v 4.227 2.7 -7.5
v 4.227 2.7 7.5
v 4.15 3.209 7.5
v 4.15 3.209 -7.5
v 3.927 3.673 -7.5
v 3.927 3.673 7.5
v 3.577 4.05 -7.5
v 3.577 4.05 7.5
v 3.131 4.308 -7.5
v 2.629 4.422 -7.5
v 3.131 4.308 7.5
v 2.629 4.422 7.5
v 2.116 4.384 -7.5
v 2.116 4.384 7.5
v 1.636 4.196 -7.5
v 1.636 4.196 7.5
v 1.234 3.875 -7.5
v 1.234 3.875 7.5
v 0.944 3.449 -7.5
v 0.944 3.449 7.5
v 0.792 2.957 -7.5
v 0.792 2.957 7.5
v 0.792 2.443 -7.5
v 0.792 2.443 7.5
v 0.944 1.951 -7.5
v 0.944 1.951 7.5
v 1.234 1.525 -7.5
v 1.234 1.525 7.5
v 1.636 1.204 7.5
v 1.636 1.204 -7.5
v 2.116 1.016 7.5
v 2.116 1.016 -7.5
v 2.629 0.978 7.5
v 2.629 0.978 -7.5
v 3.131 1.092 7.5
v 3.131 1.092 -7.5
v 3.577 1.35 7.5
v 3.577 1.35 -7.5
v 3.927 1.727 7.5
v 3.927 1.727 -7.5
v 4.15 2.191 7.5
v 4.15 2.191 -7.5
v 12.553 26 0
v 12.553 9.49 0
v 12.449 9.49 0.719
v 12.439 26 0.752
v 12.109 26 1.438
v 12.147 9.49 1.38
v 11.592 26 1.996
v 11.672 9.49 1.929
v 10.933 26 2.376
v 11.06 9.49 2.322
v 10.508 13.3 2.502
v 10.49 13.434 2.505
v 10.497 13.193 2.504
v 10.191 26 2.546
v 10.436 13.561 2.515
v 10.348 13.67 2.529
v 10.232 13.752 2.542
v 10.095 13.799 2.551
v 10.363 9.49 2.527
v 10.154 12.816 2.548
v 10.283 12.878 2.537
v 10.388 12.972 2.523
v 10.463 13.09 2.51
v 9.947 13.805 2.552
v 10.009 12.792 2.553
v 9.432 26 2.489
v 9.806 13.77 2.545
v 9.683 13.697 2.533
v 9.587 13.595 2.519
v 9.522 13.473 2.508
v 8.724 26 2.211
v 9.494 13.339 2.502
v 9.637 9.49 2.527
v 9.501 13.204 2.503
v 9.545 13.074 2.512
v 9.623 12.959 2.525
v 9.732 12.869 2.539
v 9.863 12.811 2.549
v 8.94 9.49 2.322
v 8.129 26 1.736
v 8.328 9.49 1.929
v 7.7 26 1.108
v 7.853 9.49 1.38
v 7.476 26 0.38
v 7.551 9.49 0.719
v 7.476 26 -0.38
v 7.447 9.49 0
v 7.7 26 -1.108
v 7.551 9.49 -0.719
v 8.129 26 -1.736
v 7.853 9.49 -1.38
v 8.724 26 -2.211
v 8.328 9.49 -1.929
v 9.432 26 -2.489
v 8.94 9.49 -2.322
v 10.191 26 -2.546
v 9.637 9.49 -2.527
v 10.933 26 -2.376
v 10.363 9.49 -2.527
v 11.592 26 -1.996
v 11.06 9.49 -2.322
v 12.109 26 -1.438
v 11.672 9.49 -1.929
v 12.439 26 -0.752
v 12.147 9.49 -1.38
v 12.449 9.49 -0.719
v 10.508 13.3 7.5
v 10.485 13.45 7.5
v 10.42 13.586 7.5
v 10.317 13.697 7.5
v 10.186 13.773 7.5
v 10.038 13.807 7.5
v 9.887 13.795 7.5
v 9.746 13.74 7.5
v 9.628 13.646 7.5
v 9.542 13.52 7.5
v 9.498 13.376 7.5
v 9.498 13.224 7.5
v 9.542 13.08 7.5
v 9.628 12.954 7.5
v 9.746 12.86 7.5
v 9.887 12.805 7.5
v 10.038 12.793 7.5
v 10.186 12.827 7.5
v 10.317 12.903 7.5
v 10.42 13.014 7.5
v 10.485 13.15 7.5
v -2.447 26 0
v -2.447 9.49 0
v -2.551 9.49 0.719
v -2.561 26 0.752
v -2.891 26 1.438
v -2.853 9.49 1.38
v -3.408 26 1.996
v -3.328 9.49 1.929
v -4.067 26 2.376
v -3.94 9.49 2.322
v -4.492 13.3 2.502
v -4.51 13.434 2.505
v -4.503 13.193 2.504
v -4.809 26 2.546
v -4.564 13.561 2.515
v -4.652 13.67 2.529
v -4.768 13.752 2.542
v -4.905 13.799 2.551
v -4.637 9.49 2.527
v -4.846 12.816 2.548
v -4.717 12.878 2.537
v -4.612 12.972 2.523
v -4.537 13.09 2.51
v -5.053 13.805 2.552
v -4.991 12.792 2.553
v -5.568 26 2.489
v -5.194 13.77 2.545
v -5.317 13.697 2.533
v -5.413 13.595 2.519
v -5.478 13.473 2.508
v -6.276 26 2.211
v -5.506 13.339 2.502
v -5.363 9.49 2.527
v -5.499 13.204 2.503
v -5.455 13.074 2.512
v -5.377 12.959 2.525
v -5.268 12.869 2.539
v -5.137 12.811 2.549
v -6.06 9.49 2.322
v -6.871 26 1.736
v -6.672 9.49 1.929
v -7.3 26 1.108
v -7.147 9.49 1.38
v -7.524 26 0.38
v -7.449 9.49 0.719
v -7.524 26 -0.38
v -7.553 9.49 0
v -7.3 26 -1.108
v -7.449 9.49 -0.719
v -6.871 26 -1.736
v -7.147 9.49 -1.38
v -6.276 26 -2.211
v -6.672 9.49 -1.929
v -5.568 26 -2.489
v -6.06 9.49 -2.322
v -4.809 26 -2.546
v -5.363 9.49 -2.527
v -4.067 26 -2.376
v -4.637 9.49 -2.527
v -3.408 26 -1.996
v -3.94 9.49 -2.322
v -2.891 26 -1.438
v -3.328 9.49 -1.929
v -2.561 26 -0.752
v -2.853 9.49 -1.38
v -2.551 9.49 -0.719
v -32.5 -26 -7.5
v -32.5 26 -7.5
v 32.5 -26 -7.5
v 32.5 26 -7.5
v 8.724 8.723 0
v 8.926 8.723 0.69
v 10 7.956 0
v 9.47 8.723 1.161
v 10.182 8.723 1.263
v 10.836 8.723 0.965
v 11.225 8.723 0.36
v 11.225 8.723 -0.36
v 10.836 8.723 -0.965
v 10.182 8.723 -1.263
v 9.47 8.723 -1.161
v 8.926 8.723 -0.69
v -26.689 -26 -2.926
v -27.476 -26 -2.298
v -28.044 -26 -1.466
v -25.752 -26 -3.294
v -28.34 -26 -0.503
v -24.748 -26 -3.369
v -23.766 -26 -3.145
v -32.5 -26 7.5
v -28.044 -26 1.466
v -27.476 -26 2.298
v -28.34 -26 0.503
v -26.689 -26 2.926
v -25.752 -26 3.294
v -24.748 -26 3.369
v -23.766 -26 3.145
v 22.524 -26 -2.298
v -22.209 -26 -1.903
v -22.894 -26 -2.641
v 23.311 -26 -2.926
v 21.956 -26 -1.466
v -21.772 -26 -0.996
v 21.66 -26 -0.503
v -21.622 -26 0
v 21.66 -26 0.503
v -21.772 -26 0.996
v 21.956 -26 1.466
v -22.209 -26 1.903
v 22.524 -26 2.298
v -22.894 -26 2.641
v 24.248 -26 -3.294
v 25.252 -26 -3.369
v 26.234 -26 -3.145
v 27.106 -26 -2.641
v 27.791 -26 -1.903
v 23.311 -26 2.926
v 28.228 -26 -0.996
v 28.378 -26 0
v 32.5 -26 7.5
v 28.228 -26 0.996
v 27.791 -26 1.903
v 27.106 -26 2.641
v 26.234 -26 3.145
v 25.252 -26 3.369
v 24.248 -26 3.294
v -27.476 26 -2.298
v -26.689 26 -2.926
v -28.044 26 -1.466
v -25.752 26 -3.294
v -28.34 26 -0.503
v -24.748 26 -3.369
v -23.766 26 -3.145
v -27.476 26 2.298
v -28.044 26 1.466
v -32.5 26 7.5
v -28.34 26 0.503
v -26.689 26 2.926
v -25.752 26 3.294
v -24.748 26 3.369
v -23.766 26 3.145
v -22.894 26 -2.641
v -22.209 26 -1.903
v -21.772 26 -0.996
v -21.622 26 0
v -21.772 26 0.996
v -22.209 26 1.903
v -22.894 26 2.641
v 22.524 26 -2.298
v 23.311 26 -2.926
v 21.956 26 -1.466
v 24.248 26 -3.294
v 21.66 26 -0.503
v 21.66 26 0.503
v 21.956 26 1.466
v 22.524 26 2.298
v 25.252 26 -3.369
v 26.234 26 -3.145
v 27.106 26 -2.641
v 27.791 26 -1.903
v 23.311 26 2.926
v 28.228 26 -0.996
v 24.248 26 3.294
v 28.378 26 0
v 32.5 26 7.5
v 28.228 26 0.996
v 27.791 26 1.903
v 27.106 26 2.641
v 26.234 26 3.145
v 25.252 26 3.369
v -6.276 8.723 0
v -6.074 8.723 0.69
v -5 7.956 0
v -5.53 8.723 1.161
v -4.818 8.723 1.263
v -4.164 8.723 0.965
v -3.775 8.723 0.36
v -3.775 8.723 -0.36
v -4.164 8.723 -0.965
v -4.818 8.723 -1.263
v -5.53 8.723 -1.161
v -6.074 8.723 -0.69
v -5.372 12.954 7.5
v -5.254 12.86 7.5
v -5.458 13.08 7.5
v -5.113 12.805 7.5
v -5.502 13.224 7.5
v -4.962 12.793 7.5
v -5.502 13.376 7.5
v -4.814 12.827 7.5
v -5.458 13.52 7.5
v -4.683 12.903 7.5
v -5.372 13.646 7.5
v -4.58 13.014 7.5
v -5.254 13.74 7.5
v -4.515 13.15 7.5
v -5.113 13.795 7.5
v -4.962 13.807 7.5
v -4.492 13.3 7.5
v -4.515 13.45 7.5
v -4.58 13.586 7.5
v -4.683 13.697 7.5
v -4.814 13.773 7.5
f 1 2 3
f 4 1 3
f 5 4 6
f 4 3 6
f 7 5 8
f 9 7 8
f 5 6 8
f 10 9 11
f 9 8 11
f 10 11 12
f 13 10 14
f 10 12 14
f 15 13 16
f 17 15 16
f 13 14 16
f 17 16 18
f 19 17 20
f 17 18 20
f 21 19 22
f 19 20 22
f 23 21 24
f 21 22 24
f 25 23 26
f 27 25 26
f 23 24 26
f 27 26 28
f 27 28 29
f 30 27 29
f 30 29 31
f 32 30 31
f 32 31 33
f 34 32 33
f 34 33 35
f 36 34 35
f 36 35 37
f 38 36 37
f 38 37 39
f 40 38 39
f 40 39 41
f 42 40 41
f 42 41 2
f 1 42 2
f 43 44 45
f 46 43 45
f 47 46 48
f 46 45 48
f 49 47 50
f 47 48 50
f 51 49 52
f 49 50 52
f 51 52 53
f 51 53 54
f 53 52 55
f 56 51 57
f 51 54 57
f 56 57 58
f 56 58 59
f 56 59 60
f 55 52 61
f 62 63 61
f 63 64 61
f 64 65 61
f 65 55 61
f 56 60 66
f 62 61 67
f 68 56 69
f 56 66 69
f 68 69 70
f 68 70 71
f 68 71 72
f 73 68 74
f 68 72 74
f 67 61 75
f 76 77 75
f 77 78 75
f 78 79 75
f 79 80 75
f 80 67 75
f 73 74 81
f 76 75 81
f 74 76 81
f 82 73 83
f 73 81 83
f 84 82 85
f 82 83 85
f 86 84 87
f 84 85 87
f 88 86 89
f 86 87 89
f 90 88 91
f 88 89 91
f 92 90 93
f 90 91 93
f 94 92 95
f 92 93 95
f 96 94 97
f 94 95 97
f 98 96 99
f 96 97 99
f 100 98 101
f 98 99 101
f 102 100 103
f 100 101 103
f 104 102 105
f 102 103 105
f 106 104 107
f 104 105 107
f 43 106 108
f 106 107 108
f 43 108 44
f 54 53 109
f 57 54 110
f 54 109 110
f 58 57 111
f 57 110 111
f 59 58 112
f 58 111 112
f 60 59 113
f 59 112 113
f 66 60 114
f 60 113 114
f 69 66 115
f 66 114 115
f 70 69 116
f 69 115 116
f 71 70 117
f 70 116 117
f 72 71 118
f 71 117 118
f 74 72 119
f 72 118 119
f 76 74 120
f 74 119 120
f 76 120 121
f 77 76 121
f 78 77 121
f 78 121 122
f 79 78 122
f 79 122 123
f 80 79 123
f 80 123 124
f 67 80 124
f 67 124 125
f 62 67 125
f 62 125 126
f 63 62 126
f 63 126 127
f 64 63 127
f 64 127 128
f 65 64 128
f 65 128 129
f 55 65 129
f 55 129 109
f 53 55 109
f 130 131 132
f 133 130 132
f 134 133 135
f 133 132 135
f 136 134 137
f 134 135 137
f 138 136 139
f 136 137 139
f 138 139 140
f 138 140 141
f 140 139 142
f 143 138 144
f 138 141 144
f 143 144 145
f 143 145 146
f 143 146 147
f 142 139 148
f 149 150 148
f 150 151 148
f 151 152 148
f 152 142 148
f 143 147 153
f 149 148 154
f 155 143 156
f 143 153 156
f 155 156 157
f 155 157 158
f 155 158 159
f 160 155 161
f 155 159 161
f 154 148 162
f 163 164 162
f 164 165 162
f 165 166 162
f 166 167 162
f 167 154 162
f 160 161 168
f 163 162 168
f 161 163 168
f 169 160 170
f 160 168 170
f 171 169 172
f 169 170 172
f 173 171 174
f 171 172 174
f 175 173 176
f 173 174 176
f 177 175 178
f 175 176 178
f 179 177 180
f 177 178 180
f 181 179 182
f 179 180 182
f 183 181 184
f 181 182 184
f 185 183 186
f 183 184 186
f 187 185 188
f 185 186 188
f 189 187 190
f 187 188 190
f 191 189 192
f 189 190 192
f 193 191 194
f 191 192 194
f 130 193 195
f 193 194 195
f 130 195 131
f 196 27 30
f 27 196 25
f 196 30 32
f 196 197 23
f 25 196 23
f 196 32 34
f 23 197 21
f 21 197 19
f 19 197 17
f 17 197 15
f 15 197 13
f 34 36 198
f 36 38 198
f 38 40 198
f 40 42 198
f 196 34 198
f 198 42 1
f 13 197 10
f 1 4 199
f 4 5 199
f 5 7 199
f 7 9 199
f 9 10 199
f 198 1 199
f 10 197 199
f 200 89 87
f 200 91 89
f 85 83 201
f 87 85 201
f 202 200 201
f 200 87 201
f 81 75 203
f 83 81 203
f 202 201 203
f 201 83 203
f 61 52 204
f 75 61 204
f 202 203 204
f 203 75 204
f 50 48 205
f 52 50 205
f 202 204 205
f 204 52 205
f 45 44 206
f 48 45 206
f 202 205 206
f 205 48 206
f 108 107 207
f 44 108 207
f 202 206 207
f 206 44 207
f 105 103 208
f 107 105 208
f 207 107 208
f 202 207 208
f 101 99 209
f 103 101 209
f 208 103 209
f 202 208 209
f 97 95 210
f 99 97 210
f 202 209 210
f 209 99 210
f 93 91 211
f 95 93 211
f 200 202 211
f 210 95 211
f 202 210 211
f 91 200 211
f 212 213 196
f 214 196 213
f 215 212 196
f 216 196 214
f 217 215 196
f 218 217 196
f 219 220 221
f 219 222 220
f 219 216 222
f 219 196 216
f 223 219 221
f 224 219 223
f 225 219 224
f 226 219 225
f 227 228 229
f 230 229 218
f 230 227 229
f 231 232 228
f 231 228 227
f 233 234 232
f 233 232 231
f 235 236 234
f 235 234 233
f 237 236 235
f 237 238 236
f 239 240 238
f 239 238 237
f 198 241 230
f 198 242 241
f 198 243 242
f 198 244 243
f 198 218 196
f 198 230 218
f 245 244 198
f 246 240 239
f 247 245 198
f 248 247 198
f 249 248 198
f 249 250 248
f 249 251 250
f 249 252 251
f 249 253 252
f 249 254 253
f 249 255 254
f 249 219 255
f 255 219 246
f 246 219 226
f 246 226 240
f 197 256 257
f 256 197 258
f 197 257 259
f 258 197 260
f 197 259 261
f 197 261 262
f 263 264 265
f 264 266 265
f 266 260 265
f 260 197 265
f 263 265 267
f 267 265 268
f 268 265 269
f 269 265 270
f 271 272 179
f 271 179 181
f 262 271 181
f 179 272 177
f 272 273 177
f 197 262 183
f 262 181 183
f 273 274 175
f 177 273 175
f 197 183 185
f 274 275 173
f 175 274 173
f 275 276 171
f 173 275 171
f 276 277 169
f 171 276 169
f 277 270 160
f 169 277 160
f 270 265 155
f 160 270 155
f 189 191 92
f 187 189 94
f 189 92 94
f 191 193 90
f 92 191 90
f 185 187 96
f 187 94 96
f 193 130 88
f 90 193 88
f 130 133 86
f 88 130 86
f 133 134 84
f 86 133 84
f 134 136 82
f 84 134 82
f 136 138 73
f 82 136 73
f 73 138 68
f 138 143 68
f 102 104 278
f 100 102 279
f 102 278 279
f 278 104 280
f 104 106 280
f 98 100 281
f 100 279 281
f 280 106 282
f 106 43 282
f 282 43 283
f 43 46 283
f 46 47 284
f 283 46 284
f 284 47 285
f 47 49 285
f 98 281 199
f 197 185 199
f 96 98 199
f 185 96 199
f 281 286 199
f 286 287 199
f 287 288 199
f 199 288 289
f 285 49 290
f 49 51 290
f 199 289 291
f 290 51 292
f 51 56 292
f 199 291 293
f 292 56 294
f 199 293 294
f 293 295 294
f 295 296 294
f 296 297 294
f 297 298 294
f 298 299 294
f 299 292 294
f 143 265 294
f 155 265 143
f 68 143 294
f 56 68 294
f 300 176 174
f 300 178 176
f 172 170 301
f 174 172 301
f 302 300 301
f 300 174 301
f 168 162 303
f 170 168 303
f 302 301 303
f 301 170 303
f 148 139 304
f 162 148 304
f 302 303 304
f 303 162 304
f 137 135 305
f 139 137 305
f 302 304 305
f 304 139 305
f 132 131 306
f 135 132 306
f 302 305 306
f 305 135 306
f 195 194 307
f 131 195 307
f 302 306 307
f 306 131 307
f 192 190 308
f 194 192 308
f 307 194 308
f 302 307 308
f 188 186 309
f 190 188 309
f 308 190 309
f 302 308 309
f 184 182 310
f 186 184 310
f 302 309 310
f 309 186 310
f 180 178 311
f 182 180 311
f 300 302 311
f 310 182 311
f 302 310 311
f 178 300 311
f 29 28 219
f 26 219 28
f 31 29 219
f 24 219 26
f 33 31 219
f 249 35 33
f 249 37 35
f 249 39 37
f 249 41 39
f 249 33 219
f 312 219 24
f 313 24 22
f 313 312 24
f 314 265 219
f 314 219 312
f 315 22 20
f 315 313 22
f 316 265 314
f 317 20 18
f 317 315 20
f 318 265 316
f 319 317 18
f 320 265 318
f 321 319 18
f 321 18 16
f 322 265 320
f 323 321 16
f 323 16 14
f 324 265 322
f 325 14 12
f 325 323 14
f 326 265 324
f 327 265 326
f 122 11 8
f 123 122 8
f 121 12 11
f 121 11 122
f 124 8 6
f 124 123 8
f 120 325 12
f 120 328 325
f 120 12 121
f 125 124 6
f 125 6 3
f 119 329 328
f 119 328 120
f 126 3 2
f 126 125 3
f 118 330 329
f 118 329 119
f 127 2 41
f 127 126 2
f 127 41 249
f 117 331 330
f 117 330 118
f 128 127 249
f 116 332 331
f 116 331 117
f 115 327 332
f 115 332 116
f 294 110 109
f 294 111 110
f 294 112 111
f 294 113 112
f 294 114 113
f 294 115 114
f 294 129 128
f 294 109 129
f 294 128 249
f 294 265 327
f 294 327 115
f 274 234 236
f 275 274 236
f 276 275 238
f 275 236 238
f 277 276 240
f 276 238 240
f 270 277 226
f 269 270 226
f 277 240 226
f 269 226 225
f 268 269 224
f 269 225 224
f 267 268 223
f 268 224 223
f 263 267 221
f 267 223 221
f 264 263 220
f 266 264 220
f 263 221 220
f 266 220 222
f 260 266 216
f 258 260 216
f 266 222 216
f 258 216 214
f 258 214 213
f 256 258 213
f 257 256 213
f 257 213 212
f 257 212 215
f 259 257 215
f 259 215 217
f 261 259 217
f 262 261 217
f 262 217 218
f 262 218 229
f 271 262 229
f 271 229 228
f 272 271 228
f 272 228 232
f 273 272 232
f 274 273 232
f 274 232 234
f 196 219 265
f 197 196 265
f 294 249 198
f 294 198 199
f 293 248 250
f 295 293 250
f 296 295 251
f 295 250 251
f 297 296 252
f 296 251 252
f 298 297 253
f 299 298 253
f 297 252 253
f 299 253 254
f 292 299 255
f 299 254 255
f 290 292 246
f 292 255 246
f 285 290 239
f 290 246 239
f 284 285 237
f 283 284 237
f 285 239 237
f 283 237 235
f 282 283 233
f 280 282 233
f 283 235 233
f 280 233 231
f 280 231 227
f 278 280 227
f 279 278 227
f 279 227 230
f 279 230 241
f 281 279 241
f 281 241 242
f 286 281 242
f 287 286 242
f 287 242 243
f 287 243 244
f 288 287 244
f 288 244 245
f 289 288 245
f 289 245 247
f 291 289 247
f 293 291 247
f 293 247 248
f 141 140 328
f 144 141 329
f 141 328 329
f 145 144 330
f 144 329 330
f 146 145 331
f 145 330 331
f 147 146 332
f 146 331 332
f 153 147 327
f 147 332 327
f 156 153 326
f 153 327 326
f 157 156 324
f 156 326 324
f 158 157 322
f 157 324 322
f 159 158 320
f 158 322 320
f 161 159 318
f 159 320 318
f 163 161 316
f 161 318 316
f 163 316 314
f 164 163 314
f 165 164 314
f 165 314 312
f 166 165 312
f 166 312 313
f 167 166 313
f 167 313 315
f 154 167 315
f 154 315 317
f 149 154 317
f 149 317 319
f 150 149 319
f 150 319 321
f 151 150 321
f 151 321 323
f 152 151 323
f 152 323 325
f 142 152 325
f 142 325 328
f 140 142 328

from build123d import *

# Parameters (mm, degrees)
SKETCH1_W                   = 65
SKETCH1_H                   = 52
BASE_EXTRUDE_DEPTH          = 7.5
F_1_4_20_TAPPED_HOLE1_D     = 5.1054
F_1_4_20_TAPPED_HOLE1_DEPTH = 16.51
F_1_4_20_TAPPED_HOLE1_TIP   = 1.533816902
F_1_4_CLEARANCE_HOLE1_D     = 6.7564
F_8_32_TAPPED_HOLE1_D       = 3.4544
CUT_EXTRUDE1_REACH          = 17
SKETCH8_R                   = 0.508


with BuildPart() as part:
    # Sketch1 → Base-Extrude (new body, symmetric)
    with BuildSketch(Plane.XY):
        Rectangle(SKETCH1_W, SKETCH1_H)
    extrude(amount=BASE_EXTRUDE_DEPTH, both=True)

    # 1/4-20 Tapped Hole1
    with Locations(Plane(origin=(0, 26, 0), x_dir=(-1, 0, 0), z_dir=(0, 1, 0))):
        with Locations((5, 0), (-10, 0)):
            Hole(F_1_4_20_TAPPED_HOLE1_D / 2, depth=F_1_4_20_TAPPED_HOLE1_DEPTH)
            with Locations((0, 0, -(F_1_4_20_TAPPED_HOLE1_DEPTH + F_1_4_20_TAPPED_HOLE1_TIP / 2))):  # 118° drill point
                Cone(0, F_1_4_20_TAPPED_HOLE1_D / 2, F_1_4_20_TAPPED_HOLE1_TIP, mode=Mode.SUBTRACT)

    # 1/4 Clearance Hole1 (through all)
    with Locations(Plane(origin=(0, 26, 0), x_dir=(-1, 0, 0), z_dir=(0, 1, 0))):
        with Locations((-25, 0), (25, 0)):
            Hole(F_1_4_CLEARANCE_HOLE1_D / 2)

    # #8-32 Tapped Hole1 (through all)
    with Locations(Plane(origin=(0, 0, -7.5), x_dir=(-1, 0, 0), z_dir=(0, 0, -1))):
        with Locations((-2.5, 2.7)):
            Hole(F_8_32_TAPPED_HOLE1_D / 2)

    # Sketch8 → Cut-Extrude1 (cut, up to next)
    with BuildSketch(Plane.XY.offset(7.5), mode=Mode.PRIVATE) as cut_extrude1_sk1:
        with Locations((10, 13.3)):
            Circle(SKETCH8_R)
    cut_extrude1_tool1 = extrude(cut_extrude1_sk1.sketch, amount=-CUT_EXTRUDE1_REACH, mode=Mode.PRIVATE) & part.part
    add(cut_extrude1_tool1.solids().sort_by_distance((10, 13.3, 7.5))[0], mode=Mode.SUBTRACT)
    # Sketch8 → Cut-Extrude1 (cut, up to next)
    with BuildSketch(Plane.XY.offset(7.5), mode=Mode.PRIVATE) as cut_extrude1_sk2:
        with Locations((-5, 13.3)):
            Circle(SKETCH8_R)
    cut_extrude1_tool2 = extrude(cut_extrude1_sk2.sketch, amount=-CUT_EXTRUDE1_REACH, mode=Mode.PRIVATE) & part.part
    add(cut_extrude1_tool2.solids().sort_by_distance((-5, 13.3, 7.5))[0], mode=Mode.SUBTRACT)


solid = part.part
